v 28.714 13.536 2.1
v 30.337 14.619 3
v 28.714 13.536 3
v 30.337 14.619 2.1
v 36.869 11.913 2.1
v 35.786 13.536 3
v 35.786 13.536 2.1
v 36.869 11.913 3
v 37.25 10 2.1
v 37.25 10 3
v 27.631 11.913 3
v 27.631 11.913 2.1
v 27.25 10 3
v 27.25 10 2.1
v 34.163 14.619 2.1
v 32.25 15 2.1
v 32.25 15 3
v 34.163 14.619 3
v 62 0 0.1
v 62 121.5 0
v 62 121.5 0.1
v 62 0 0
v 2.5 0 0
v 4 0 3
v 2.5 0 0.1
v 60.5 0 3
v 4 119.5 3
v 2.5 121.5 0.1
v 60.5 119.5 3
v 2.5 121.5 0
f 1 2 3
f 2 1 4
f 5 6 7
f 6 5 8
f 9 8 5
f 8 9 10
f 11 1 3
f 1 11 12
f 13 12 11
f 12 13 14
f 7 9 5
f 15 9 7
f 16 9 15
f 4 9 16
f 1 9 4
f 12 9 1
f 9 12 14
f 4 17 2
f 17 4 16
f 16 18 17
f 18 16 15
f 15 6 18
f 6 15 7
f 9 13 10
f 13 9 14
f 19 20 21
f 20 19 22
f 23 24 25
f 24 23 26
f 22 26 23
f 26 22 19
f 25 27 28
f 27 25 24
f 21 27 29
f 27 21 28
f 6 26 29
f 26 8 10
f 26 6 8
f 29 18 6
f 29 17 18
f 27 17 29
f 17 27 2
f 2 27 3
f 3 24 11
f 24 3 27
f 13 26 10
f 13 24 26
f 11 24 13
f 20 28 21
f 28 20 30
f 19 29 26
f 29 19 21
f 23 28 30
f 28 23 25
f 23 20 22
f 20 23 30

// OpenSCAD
boxWallThickness = 4;
coverThickness = 3;
notchWidth = 10;
notchThickness = 1;
printerMargin = 0.5;

// Box inner size
boxSizeHeight = boxWallThickness+coverThickness   + 57;
boxSizeWidth  = 2*boxWallThickness + 116;
boxSizeDepth  = 2*boxWallThickness + 57;


module notch() {
  intersection(){
    cylinder(d=notchWidth, h=notchThickness);
    translate([-notchWidth/2,0,0])
      cube([notchWidth, notchWidth, notchThickness]);
  }
}
module box() {
  bwt = boxWallThickness;
  difference(){
    cube([boxSizeDepth, boxSizeWidth, boxSizeHeight]);
   translate([boxWallThickness, boxWallThickness, boxWallThickness]){
      cube([boxSizeDepth-2*boxWallThickness, boxSizeWidth-2*boxWallThickness, boxSizeHeight-boxWallThickness-coverThickness]);
    }
    
    translate([0,0, boxSizeHeight-coverThickness]) cover(0, false);
  }  
}

module cover(margin=printerMargin, notch=true){
  h = boxSizeWidth-boxWallThickness-margin;
  x = boxSizeDepth-boxWallThickness*2-margin;
  
  translate([boxWallThickness+0,0,0]){
    difference(){
      hull() {
        #cube([x, h, coverThickness]);
        #translate([-coverThickness/2, 0,0])
          cube([x+coverThickness, h+coverThickness/1.5, 0.1]);
      }
      
      if (notch)
        translate([x/2, 10, coverThickness-notchThickness+0.1])
          notch();
    }
  }
}


//box();
cover();
